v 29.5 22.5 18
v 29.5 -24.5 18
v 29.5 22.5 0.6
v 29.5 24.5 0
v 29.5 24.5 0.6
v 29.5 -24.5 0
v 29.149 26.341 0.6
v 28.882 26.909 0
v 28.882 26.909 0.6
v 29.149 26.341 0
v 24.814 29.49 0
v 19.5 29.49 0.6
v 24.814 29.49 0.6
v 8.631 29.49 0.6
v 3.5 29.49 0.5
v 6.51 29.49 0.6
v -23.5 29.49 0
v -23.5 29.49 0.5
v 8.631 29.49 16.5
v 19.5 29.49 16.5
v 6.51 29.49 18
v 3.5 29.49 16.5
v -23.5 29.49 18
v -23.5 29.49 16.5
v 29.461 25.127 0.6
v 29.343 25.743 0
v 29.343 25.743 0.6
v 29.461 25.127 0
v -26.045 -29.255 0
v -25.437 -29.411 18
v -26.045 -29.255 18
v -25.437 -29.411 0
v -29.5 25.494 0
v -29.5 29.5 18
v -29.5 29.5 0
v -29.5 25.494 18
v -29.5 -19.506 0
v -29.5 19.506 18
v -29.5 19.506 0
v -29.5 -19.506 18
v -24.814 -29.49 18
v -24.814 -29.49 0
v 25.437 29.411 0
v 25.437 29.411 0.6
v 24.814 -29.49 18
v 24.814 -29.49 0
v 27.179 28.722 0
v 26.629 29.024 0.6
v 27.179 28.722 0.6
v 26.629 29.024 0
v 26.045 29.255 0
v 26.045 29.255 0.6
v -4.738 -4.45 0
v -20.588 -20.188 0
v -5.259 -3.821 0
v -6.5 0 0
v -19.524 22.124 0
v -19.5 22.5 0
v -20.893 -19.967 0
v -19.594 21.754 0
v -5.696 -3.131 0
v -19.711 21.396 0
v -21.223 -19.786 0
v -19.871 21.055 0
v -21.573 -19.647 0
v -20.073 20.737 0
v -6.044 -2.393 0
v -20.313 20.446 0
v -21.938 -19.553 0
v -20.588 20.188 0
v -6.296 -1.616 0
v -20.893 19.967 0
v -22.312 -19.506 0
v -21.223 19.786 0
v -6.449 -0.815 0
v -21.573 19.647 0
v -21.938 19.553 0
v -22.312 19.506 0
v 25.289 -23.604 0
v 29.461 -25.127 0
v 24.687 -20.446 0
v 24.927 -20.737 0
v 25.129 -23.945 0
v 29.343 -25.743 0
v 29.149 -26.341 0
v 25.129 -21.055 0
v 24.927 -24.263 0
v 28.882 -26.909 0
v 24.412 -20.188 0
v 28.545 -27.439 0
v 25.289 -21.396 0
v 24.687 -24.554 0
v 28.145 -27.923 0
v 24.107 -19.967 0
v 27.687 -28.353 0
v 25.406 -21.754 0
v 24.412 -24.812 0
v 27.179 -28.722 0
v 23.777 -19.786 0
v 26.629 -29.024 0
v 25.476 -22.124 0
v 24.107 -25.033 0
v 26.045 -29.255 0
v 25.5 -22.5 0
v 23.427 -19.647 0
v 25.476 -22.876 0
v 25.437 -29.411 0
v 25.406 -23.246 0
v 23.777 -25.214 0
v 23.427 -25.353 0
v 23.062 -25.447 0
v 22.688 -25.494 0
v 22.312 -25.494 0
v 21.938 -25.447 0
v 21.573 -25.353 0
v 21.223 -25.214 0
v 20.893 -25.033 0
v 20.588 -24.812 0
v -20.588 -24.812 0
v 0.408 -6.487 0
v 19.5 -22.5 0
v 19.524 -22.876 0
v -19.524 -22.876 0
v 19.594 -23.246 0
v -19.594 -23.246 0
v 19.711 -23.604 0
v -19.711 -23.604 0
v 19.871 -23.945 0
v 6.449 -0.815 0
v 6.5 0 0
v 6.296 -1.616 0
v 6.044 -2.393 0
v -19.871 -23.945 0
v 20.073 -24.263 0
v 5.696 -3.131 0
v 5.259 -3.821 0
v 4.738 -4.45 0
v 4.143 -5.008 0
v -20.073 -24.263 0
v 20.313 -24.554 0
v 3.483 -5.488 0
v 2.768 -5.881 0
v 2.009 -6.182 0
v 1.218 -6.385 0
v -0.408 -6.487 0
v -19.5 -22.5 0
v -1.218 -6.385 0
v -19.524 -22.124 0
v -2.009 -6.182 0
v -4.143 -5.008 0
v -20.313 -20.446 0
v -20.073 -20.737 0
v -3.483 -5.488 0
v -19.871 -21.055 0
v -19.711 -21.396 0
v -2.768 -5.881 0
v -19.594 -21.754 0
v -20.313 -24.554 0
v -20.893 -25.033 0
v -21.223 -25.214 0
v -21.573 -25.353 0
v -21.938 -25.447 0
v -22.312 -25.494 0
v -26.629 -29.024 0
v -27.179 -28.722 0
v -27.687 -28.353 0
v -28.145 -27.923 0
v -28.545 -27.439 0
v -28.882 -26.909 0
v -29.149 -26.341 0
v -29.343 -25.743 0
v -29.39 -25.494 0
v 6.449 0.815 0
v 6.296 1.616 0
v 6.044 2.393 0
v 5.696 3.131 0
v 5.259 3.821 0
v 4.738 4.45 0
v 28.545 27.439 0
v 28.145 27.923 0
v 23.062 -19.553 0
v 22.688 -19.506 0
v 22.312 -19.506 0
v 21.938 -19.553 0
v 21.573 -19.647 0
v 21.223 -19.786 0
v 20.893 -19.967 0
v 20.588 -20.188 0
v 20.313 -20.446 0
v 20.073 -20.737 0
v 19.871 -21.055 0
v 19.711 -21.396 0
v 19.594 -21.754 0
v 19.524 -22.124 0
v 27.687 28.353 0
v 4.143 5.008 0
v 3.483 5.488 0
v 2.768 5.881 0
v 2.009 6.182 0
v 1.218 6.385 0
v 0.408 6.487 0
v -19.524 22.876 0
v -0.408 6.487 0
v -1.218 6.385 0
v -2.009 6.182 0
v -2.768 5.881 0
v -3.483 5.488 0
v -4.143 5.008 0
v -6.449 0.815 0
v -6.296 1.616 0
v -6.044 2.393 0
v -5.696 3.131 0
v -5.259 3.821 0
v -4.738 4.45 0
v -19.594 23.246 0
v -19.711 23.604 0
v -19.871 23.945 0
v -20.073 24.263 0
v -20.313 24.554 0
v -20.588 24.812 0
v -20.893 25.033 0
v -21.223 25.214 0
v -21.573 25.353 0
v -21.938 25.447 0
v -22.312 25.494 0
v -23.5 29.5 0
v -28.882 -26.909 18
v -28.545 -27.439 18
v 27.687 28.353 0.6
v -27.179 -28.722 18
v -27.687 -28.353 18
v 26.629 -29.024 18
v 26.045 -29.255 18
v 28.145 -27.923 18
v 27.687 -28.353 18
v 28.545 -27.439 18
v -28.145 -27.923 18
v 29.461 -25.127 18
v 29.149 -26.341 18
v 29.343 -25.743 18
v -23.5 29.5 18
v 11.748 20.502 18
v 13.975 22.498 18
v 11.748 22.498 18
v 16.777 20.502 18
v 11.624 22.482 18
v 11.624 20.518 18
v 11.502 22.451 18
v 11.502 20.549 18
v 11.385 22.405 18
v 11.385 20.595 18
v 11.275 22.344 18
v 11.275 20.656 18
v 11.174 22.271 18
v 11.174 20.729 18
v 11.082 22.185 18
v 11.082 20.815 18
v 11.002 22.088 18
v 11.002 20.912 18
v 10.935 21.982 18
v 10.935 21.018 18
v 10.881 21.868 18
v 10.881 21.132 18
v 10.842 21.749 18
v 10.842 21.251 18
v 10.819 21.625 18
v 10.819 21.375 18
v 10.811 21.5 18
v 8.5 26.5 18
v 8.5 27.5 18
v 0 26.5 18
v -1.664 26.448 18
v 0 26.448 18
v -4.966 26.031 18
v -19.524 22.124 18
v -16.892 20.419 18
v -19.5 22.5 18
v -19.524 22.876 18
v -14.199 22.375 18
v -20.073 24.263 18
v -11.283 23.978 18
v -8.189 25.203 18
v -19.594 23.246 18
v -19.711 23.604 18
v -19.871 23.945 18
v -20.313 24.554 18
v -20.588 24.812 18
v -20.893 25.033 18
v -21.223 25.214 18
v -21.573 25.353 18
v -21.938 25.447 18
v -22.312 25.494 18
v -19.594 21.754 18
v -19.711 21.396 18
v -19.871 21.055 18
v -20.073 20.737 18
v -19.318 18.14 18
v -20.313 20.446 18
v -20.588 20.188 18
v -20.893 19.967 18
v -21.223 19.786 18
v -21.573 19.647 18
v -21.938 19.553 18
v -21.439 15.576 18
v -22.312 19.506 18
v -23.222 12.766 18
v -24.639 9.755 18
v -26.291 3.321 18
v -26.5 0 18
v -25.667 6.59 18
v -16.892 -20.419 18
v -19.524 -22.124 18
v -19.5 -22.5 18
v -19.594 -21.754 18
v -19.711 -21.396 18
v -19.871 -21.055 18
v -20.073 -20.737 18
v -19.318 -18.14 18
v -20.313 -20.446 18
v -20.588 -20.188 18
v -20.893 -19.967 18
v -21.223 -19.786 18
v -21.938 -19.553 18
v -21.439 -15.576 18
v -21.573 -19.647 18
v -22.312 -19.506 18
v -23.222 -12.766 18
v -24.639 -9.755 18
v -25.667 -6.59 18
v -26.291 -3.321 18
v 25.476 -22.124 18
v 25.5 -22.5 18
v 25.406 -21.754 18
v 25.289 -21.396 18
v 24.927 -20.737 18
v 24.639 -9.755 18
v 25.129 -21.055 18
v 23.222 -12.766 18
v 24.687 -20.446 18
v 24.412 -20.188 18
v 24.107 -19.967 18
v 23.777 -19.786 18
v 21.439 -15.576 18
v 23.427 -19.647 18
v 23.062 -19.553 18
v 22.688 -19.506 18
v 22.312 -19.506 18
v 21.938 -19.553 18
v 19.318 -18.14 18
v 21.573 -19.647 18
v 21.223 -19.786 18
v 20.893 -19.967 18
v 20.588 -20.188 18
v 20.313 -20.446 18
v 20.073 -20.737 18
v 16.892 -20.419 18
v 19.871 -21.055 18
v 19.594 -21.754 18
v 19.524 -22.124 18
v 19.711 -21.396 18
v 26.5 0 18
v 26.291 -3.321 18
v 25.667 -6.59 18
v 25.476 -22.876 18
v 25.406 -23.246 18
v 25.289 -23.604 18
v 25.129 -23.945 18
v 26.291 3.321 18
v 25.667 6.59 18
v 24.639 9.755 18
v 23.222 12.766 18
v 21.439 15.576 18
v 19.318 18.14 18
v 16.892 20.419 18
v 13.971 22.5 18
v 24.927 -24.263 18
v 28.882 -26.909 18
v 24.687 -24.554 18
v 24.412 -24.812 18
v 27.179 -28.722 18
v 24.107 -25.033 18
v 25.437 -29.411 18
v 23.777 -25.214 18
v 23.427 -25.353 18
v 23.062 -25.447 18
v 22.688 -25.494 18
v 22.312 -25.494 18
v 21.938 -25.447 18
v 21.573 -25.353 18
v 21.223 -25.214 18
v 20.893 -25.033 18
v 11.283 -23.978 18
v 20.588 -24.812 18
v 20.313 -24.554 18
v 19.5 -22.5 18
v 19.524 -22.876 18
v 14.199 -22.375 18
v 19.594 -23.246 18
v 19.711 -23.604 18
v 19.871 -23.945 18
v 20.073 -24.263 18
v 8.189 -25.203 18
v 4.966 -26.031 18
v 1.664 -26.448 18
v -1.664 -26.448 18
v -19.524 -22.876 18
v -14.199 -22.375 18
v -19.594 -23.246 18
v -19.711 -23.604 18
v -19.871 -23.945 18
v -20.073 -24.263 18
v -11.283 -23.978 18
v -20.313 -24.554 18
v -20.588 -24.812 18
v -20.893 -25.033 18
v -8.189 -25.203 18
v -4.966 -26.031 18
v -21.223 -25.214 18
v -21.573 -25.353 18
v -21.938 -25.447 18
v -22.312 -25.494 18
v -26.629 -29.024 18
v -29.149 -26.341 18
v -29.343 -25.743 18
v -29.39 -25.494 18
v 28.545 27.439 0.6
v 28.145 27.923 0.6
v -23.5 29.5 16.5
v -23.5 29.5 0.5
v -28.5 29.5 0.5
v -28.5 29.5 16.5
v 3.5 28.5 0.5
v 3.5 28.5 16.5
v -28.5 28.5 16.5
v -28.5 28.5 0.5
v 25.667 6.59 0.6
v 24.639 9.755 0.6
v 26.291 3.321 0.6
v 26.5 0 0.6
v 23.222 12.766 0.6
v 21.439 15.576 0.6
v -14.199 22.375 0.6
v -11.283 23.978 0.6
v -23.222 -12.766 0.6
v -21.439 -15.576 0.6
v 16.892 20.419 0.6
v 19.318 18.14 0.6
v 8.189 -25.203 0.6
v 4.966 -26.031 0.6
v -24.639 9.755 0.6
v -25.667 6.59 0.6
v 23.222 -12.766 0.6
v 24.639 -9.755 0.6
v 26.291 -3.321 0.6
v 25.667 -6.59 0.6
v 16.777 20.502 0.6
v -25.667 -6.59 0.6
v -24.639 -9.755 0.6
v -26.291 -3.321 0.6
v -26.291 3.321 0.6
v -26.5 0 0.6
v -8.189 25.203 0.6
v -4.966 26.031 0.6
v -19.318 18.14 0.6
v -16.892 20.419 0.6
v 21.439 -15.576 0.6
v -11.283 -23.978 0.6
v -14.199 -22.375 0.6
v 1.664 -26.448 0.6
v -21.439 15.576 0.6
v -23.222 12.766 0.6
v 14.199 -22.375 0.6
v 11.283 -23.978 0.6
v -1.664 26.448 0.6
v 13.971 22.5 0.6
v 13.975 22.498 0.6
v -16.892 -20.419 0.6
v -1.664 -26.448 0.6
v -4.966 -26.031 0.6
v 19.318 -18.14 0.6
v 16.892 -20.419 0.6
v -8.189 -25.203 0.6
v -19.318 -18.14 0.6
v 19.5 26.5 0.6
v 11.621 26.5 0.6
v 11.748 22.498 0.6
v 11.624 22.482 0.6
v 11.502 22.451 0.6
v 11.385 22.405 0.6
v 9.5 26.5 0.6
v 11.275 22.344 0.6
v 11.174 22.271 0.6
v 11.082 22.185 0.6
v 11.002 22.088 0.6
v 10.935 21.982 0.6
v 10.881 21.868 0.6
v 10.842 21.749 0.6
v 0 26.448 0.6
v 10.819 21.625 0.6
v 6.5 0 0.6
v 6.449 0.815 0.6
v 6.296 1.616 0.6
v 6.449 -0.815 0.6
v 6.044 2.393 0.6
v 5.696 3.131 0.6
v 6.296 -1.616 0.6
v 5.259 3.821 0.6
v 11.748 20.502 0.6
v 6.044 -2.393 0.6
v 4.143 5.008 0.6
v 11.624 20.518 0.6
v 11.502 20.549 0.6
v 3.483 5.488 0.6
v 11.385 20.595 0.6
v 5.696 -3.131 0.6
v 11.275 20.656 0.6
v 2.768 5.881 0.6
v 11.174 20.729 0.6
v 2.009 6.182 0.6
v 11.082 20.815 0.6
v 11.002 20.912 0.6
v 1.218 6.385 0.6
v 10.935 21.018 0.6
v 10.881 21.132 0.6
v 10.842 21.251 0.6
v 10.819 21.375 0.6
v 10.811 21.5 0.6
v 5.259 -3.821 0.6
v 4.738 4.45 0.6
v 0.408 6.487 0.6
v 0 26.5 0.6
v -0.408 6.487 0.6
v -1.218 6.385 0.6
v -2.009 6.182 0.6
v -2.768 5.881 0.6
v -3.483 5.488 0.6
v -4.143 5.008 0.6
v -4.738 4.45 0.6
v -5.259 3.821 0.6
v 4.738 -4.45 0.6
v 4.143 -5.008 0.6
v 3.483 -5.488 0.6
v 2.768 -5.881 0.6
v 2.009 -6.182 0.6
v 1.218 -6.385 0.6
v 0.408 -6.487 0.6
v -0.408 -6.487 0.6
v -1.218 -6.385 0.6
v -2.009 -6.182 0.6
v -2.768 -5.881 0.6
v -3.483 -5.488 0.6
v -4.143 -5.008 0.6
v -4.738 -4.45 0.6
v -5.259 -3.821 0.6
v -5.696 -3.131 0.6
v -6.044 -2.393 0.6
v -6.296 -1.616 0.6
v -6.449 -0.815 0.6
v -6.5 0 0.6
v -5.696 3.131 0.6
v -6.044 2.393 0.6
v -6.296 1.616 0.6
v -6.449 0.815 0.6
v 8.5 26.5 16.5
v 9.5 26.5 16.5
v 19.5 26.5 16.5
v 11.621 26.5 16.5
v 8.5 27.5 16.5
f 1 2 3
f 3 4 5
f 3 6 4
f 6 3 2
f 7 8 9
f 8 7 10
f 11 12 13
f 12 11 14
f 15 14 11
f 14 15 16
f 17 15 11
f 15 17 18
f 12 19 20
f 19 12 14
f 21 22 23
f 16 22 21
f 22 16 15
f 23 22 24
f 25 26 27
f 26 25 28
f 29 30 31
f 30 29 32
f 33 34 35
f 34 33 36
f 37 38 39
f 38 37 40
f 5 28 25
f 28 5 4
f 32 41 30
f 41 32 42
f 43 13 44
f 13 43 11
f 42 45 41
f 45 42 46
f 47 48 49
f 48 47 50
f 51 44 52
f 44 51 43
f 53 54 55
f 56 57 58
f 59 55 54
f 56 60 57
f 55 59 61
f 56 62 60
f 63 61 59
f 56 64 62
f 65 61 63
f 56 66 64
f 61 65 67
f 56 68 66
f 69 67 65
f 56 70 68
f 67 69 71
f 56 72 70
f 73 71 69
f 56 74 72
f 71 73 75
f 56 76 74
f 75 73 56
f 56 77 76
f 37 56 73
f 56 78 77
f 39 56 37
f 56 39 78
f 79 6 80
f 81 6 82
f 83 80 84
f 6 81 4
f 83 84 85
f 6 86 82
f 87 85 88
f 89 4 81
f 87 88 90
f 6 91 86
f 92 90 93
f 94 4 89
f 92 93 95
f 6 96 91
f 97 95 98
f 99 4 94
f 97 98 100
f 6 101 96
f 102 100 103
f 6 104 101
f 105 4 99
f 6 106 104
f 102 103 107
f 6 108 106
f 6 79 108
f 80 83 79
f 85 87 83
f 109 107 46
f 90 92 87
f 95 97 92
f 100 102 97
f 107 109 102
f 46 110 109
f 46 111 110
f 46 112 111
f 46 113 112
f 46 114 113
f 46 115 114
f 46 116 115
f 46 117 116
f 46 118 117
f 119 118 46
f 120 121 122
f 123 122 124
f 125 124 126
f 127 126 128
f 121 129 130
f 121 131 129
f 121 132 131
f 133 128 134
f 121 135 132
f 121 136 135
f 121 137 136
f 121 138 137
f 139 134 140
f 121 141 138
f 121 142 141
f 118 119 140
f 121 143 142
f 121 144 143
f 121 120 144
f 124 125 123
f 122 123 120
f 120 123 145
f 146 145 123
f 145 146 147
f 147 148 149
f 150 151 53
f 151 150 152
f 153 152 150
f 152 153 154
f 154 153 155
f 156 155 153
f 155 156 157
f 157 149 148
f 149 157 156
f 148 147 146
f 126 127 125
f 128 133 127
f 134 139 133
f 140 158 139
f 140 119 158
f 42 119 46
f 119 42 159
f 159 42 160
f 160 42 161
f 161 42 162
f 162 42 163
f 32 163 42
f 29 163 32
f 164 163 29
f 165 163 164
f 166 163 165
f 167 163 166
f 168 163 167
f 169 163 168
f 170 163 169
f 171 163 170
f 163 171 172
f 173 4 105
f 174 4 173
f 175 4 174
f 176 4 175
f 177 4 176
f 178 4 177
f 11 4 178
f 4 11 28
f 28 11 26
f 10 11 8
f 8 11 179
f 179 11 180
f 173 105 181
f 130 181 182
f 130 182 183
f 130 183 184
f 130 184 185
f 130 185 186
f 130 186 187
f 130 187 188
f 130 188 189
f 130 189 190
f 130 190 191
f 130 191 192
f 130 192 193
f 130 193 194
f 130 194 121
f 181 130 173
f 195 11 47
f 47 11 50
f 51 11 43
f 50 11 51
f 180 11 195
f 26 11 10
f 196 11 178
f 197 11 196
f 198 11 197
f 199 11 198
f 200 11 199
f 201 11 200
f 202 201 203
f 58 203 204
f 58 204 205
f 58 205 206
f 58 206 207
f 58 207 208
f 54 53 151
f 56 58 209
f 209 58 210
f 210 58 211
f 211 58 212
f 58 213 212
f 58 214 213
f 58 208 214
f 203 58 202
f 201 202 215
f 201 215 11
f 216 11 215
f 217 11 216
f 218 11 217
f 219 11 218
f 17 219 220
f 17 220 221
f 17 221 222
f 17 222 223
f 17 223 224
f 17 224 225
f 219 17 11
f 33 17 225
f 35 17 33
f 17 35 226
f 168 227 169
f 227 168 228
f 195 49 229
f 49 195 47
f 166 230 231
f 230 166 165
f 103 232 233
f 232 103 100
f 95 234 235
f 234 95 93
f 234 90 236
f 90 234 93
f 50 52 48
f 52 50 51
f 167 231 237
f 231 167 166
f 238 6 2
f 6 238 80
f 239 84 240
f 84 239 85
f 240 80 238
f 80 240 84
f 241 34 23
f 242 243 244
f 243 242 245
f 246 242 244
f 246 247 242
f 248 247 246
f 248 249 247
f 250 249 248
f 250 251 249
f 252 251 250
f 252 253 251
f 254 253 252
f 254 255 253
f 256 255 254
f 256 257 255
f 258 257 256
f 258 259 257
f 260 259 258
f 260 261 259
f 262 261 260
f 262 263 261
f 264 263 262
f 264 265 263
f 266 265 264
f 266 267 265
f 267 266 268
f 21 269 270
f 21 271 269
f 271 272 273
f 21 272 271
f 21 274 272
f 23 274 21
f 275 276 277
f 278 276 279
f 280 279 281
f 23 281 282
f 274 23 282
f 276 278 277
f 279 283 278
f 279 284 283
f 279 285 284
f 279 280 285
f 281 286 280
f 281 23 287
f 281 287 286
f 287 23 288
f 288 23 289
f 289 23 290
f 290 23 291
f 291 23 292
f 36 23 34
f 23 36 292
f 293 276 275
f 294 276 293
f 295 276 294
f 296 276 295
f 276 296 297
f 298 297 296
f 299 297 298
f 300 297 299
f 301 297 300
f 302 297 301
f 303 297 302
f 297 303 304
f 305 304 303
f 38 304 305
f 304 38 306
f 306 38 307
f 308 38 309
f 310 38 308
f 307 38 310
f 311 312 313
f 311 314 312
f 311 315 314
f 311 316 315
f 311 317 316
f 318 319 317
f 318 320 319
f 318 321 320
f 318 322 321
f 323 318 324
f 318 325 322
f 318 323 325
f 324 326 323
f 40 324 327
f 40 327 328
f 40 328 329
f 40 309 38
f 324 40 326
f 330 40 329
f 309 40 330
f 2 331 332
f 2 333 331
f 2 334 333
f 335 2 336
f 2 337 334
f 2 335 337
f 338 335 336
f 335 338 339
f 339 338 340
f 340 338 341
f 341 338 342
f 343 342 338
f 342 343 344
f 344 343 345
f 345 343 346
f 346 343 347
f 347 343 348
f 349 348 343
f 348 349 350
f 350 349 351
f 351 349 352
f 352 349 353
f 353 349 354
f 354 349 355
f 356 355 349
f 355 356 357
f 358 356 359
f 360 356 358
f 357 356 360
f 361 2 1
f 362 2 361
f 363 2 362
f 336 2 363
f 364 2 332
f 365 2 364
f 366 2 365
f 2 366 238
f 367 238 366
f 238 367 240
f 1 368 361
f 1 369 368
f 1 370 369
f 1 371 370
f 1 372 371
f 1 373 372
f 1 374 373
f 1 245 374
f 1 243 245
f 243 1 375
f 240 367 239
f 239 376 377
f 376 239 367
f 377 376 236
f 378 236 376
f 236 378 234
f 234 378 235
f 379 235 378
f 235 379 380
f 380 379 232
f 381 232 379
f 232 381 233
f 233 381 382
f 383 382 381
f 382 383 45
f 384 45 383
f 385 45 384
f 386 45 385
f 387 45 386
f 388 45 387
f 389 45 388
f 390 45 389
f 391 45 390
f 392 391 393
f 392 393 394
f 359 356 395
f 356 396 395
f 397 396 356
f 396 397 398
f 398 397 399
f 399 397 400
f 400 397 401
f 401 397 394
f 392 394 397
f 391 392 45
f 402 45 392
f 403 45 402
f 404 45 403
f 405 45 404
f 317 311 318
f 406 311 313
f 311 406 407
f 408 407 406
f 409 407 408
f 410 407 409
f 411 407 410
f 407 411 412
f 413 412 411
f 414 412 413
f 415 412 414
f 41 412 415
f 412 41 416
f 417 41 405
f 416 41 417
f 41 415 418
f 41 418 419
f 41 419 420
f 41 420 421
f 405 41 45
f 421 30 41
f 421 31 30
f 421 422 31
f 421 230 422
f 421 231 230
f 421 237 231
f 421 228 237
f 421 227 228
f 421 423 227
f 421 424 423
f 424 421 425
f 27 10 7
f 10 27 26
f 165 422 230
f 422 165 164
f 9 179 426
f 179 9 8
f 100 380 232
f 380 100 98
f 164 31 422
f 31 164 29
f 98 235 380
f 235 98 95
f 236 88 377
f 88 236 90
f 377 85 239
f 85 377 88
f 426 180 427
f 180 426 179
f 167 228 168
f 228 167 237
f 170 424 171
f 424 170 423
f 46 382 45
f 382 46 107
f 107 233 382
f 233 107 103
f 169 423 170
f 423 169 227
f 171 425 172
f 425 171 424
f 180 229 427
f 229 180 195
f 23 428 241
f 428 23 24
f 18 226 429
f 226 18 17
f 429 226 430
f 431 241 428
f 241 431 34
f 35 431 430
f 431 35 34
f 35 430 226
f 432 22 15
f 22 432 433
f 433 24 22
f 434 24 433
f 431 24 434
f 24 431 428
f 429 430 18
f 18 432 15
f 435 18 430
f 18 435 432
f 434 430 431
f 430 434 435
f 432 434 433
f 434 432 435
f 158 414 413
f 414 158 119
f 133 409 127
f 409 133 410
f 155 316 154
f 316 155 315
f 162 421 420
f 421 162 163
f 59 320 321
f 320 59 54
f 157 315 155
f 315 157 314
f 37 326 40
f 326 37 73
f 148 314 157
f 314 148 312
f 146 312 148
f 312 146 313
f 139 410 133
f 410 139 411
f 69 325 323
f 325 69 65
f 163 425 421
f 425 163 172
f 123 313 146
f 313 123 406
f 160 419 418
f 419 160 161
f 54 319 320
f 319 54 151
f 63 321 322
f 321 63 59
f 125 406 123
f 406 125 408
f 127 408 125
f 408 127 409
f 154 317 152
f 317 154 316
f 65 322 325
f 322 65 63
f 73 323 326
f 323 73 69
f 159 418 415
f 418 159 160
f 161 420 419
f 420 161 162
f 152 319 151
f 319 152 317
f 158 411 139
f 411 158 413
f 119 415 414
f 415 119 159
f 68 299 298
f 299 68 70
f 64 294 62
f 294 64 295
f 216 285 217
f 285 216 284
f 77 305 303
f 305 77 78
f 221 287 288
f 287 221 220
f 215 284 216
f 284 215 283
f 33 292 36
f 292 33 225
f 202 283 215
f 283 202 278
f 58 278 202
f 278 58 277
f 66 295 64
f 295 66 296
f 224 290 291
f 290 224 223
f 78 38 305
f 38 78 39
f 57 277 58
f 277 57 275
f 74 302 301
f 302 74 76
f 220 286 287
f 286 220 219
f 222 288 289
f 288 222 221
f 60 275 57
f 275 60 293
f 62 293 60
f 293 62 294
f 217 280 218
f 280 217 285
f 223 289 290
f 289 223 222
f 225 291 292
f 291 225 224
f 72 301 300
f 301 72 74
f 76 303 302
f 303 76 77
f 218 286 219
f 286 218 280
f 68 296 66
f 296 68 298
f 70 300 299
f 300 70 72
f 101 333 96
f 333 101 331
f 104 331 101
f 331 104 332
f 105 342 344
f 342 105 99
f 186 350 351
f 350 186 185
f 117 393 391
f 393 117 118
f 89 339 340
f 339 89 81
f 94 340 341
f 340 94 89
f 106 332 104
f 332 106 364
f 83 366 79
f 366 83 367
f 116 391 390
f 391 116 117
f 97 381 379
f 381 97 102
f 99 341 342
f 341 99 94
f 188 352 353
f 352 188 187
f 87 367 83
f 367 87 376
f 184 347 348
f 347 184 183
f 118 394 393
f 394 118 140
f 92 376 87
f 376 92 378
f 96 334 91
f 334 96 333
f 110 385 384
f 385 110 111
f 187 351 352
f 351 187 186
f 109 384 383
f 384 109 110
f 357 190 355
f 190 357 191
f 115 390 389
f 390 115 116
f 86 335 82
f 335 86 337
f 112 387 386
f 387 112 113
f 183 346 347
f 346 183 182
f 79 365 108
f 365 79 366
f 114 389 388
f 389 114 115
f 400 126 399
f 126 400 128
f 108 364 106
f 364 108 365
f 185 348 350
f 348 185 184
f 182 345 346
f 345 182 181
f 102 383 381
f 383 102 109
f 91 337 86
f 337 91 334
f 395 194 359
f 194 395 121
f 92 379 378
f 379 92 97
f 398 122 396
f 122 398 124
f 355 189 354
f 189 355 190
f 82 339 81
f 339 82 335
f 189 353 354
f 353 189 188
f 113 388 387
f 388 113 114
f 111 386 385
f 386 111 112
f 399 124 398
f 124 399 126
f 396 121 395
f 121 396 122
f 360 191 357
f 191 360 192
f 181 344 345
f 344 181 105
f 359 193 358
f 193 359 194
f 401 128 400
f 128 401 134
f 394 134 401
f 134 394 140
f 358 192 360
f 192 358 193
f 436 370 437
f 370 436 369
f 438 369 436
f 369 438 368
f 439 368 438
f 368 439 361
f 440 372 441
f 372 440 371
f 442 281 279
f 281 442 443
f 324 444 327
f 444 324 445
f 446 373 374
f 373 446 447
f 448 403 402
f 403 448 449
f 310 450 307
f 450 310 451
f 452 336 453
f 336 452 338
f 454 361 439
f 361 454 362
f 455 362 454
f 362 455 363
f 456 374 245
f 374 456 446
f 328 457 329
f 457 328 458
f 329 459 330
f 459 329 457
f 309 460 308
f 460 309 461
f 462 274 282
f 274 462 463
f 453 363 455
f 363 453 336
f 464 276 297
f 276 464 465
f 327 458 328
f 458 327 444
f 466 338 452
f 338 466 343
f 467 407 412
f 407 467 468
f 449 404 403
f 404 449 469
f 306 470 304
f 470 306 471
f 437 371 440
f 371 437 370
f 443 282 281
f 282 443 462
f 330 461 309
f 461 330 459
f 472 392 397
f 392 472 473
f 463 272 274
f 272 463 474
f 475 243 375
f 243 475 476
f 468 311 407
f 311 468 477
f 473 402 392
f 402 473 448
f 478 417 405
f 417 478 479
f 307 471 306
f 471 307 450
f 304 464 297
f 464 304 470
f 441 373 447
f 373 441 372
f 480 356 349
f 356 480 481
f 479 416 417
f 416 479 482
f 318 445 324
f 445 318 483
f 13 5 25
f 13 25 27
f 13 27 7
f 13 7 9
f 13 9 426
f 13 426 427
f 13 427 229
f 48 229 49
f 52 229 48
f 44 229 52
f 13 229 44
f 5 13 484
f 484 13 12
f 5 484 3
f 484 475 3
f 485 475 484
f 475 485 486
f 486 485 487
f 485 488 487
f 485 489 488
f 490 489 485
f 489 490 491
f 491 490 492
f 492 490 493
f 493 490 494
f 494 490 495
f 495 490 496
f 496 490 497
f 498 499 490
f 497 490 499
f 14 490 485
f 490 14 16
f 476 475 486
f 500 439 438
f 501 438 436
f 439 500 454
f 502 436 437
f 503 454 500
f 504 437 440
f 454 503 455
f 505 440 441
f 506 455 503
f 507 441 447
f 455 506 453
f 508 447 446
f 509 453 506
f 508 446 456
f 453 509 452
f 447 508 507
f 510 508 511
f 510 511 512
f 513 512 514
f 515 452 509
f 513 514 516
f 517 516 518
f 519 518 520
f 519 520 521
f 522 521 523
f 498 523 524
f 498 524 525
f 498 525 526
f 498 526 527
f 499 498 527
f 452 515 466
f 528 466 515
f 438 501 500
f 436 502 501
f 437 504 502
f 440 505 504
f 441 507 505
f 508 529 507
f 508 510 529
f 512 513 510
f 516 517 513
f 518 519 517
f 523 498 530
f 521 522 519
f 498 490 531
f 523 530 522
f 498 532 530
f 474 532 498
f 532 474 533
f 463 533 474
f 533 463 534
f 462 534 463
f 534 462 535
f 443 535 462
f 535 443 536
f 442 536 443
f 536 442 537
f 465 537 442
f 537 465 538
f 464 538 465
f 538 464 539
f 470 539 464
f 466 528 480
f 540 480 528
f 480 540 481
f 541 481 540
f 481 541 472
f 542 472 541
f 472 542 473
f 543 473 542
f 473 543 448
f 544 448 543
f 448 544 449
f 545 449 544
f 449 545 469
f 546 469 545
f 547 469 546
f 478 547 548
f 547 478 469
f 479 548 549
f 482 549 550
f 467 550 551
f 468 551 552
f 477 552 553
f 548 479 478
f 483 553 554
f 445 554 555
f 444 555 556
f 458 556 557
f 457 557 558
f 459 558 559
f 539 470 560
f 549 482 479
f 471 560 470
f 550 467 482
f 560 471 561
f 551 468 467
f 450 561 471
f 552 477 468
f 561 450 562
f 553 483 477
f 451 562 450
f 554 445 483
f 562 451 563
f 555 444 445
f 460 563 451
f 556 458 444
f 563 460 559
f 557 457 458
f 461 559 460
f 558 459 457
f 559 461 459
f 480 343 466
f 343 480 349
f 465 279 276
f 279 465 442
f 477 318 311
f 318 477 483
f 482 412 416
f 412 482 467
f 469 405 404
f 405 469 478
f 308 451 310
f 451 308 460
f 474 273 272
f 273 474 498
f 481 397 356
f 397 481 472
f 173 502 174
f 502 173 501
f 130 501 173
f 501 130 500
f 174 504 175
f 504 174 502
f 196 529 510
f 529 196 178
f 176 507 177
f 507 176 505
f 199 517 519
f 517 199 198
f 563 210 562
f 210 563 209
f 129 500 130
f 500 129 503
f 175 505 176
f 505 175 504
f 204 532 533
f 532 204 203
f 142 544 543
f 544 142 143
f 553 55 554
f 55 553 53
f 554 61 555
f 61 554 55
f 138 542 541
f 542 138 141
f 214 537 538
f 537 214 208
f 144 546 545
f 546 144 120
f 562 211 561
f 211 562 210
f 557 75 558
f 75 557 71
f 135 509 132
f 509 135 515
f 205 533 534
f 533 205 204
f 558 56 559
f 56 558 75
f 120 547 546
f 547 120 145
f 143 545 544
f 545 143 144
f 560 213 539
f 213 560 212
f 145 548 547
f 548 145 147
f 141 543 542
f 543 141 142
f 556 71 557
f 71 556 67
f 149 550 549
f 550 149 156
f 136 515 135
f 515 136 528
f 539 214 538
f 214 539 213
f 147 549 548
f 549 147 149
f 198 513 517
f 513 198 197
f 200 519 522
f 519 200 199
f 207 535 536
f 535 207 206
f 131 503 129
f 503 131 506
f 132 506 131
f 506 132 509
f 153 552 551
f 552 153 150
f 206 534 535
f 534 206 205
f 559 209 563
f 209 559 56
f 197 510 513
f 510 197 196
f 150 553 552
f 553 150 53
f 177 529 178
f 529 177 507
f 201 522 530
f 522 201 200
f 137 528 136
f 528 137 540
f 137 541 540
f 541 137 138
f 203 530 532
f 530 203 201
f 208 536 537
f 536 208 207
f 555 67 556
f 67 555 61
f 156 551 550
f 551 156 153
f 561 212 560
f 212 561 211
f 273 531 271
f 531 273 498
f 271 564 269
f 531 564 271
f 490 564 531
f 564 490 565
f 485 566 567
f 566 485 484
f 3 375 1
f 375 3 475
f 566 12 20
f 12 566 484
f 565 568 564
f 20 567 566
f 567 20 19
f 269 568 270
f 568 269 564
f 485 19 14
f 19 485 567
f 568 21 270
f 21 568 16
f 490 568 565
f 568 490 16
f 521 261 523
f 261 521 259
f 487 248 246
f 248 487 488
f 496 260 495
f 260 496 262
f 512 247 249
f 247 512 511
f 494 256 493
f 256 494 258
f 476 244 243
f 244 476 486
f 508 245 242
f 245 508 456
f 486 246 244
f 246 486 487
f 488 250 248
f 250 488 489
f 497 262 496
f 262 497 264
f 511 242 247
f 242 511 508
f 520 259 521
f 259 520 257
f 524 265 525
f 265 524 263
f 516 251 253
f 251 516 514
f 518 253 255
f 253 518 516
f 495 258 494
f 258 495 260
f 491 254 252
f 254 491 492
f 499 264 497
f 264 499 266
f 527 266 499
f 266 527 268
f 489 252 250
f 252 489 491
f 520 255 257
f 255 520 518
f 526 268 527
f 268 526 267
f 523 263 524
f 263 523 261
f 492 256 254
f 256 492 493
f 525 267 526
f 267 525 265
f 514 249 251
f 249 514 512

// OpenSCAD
$fn = 50;


union() {
	difference() {
		union() {
			translate(v = [0, 0, 0]) {
				rotate(a = [0, 0, 0]) {
					hull() {
						translate(v = [-24.5000000000, 24.5000000000, 0]) {
							rotate(a = [0, 0, 0]) {
								translate(v = [0, 0, 0]) {
									rotate(a = [0, 0, 0]) {
										cylinder(h = 18, r = 5);
									}
								}
							}
						}
						translate(v = [24.5000000000, 24.5000000000, 0]) {
							rotate(a = [0, 0, 0]) {
								translate(v = [0, 0, 0]) {
									rotate(a = [0, 0, 0]) {
										cylinder(h = 18, r = 5);
									}
								}
							}
						}
						translate(v = [-24.5000000000, -24.5000000000, 0]) {
							rotate(a = [0, 0, 0]) {
								translate(v = [0, 0, 0]) {
									rotate(a = [0, 0, 0]) {
										cylinder(h = 18, r = 5);
									}
								}
							}
						}
						translate(v = [24.5000000000, -24.5000000000, 0]) {
							rotate(a = [0, 0, 0]) {
								translate(v = [0, 0, 0]) {
									rotate(a = [0, 0, 0]) {
										cylinder(h = 18, r = 5);
									}
								}
							}
						}
					}
				}
			}
			translate(v = [-29.5000000000, 23.5000000000, 0]) {
				rotate(a = [0, 0, 0]) {
					cube(size = [6, 6, 18]);
				}
			}
		}
		union() {
			#translate(v = [-28.5000000000, 28.5000000000, 0.5000000000]) {
				rotate(a = [0, 0, 0]) {
					cube(size = [32, 1, 16]);
				}
			}
			translate(v = [-30.0000000000, -22.5000000000, -125]) {
				rotate(a = [0, 0, 0]) {
					hull() {
						translate(v = [7.5000000000, 0, 0]) {
							rotate(a = [0, 0, 0]) {
								translate(v = [0, 0, 0]) {
									rotate(a = [0, 0, 0]) {
										cylinder(h = 250, r = 3.0000000000);
									}
								}
							}
						}
						translate(v = [-7.5000000000, 0, 0]) {
							rotate(a = [0, 0, 0]) {
								translate(v = [0, 0, 0]) {
									rotate(a = [0, 0, 0]) {
										cylinder(h = 250, r = 3.0000000000);
									}
								}
							}
						}
					}
				}
			}
			translate(v = [-30.0000000000, 22.5000000000, -125]) {
				rotate(a = [0, 0, 0]) {
					hull() {
						translate(v = [7.5000000000, 0, 0]) {
							rotate(a = [0, 0, 0]) {
								translate(v = [0, 0, 0]) {
									rotate(a = [0, 0, 0]) {
										cylinder(h = 250, r = 3.0000000000);
									}
								}
							}
						}
						translate(v = [-7.5000000000, 0, 0]) {
							rotate(a = [0, 0, 0]) {
								translate(v = [0, 0, 0]) {
									rotate(a = [0, 0, 0]) {
										cylinder(h = 250, r = 3.0000000000);
									}
								}
							}
						}
					}
				}
			}
			translate(v = [22.5000000000, -22.5000000000, -125.0000000000]) {
				rotate(a = [0, 0, 0]) {
					cylinder(h = 250, r = 3.0000000000);
				}
			}
			translate(v = [0, 0, 0.6000000000]) {
				rotate(a = [0, 0, 0]) {
					cylinder(h = 20.4000000000, r = 26.5000000000);
				}
			}
			translate(v = [0, 0, -9.0000000000]) {
				rotate(a = [0, 0, 0]) {
					cylinder(h = 18, r = 6.5000000000);
				}
			}
			translate(v = [0.0000000000, 22.5000000000, 0.6000000000]) {
				rotate(a = [0, 0, 0]) {
					cube(size = [29.5000000000, 4, 20.4000000000]);
				}
			}
			translate(v = [19.5000000000, 22.5000000000, 0.6000000000]) {
				rotate(a = [0, 0, 0]) {
					cube(size = [10, 7, 20.4000000000]);
				}
			}
			translate(v = [8.5000000000, 22.5000000000, 16.5000000000]) {
				rotate(a = [0, 0, 0]) {
					cube(size = [21, 7, 1.5000000000]);
				}
			}
			translate(v = [5.7500000000, 30.2500000000, 0.6000000000]) {
				rotate(a = [0, 0, -45]) {
					cube(size = [7.5000000000, 1.5000000000, 20.4000000000]);
				}
			}
			translate(v = [5.0610000000, 20.5000000000, 0.6000000000]) {
				rotate(a = [0, 0, 0]) {
					cube(size = [7.5000000000, 2, 17.4000000000]);
				}
			}
		}
	}
	union() {
		translate(v = [14.3110000000, 21.5000000000, 0]) {
			rotate(a = [0, 0, 0]) {
				hull() {
					translate(v = [2.5000000000, 0, 0]) {
						rotate(a = [0, 0, 0]) {
							#translate(v = [0, 0, 0]) {
								rotate(a = [0, 0, 0]) {
									cylinder(h = 18, r = 1.0000000000);
								}
							}
						}
					}
					translate(v = [-2.5000000000, 0, 0]) {
						rotate(a = [0, 0, 0]) {
							#translate(v = [0, 0, 0]) {
								rotate(a = [0, 0, 0]) {
									cylinder(h = 18, r = 1.0000000000);
								}
							}
						}
					}
				}
			}
		}
	}
}
